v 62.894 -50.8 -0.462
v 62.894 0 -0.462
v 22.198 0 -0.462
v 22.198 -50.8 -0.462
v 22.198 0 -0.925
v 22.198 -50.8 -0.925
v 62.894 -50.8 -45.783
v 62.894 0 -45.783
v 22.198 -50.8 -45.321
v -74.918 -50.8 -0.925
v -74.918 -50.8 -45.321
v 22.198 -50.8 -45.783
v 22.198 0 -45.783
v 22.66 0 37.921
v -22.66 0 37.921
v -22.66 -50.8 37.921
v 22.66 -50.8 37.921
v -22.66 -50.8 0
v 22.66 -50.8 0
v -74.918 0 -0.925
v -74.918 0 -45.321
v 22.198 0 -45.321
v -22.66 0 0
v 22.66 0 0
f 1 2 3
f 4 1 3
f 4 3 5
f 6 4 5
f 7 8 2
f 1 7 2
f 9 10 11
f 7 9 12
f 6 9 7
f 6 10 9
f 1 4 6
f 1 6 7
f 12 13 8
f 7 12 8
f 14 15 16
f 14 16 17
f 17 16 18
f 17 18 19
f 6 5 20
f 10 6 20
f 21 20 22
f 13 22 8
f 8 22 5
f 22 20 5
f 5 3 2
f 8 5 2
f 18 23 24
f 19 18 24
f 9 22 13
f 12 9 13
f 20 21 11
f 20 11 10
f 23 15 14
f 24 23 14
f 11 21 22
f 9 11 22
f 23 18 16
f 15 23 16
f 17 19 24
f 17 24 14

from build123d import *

# Parameters (mm, degrees)
F0_W     = 44.3958938122
F0_H     = 44.3958938122
F0_W_2   = 52.7201294899
F1_DEPTH = 50.8
F0_W_3   = 45.3208126128
F0_H_2   = 37.9214994609


# Not quite as in the source:
# - ends of sketch curves that miss each other by under 0.0002 mm in the source are joined


with BuildPart() as f1:
    # F0 (on Front) → F1 (new body)
    with BuildSketch(Plane.XZ):
        Polygon((22.1979469061, -0.92491135), (22.1979469061, -45.3208051622), (22.1979394555, -45.7832626998), (62.8941878676, -45.7832626998), (62.8941878676, -0.4624538124), (22.1979394555, -0.4624538124), align=None)
        with Locations((0, -23.1228582561)):
            Rectangle(F0_W, F0_H)
        with Locations((-48.558011651, -23.1228582561)):
            Rectangle(F0_W_2, F0_H)
    extrude(amount=F1_DEPTH)


with BuildPart() as f1b:
    # F0 (on Front) → F1, piece 2 (new body)
    with BuildSketch(Plane.XZ):
        with Locations((0, 18.9607497305)):
            Rectangle(F0_W_3, F0_H_2)
    extrude(amount=F1_DEPTH)


solid = Compound([f1.part, f1b.part])
